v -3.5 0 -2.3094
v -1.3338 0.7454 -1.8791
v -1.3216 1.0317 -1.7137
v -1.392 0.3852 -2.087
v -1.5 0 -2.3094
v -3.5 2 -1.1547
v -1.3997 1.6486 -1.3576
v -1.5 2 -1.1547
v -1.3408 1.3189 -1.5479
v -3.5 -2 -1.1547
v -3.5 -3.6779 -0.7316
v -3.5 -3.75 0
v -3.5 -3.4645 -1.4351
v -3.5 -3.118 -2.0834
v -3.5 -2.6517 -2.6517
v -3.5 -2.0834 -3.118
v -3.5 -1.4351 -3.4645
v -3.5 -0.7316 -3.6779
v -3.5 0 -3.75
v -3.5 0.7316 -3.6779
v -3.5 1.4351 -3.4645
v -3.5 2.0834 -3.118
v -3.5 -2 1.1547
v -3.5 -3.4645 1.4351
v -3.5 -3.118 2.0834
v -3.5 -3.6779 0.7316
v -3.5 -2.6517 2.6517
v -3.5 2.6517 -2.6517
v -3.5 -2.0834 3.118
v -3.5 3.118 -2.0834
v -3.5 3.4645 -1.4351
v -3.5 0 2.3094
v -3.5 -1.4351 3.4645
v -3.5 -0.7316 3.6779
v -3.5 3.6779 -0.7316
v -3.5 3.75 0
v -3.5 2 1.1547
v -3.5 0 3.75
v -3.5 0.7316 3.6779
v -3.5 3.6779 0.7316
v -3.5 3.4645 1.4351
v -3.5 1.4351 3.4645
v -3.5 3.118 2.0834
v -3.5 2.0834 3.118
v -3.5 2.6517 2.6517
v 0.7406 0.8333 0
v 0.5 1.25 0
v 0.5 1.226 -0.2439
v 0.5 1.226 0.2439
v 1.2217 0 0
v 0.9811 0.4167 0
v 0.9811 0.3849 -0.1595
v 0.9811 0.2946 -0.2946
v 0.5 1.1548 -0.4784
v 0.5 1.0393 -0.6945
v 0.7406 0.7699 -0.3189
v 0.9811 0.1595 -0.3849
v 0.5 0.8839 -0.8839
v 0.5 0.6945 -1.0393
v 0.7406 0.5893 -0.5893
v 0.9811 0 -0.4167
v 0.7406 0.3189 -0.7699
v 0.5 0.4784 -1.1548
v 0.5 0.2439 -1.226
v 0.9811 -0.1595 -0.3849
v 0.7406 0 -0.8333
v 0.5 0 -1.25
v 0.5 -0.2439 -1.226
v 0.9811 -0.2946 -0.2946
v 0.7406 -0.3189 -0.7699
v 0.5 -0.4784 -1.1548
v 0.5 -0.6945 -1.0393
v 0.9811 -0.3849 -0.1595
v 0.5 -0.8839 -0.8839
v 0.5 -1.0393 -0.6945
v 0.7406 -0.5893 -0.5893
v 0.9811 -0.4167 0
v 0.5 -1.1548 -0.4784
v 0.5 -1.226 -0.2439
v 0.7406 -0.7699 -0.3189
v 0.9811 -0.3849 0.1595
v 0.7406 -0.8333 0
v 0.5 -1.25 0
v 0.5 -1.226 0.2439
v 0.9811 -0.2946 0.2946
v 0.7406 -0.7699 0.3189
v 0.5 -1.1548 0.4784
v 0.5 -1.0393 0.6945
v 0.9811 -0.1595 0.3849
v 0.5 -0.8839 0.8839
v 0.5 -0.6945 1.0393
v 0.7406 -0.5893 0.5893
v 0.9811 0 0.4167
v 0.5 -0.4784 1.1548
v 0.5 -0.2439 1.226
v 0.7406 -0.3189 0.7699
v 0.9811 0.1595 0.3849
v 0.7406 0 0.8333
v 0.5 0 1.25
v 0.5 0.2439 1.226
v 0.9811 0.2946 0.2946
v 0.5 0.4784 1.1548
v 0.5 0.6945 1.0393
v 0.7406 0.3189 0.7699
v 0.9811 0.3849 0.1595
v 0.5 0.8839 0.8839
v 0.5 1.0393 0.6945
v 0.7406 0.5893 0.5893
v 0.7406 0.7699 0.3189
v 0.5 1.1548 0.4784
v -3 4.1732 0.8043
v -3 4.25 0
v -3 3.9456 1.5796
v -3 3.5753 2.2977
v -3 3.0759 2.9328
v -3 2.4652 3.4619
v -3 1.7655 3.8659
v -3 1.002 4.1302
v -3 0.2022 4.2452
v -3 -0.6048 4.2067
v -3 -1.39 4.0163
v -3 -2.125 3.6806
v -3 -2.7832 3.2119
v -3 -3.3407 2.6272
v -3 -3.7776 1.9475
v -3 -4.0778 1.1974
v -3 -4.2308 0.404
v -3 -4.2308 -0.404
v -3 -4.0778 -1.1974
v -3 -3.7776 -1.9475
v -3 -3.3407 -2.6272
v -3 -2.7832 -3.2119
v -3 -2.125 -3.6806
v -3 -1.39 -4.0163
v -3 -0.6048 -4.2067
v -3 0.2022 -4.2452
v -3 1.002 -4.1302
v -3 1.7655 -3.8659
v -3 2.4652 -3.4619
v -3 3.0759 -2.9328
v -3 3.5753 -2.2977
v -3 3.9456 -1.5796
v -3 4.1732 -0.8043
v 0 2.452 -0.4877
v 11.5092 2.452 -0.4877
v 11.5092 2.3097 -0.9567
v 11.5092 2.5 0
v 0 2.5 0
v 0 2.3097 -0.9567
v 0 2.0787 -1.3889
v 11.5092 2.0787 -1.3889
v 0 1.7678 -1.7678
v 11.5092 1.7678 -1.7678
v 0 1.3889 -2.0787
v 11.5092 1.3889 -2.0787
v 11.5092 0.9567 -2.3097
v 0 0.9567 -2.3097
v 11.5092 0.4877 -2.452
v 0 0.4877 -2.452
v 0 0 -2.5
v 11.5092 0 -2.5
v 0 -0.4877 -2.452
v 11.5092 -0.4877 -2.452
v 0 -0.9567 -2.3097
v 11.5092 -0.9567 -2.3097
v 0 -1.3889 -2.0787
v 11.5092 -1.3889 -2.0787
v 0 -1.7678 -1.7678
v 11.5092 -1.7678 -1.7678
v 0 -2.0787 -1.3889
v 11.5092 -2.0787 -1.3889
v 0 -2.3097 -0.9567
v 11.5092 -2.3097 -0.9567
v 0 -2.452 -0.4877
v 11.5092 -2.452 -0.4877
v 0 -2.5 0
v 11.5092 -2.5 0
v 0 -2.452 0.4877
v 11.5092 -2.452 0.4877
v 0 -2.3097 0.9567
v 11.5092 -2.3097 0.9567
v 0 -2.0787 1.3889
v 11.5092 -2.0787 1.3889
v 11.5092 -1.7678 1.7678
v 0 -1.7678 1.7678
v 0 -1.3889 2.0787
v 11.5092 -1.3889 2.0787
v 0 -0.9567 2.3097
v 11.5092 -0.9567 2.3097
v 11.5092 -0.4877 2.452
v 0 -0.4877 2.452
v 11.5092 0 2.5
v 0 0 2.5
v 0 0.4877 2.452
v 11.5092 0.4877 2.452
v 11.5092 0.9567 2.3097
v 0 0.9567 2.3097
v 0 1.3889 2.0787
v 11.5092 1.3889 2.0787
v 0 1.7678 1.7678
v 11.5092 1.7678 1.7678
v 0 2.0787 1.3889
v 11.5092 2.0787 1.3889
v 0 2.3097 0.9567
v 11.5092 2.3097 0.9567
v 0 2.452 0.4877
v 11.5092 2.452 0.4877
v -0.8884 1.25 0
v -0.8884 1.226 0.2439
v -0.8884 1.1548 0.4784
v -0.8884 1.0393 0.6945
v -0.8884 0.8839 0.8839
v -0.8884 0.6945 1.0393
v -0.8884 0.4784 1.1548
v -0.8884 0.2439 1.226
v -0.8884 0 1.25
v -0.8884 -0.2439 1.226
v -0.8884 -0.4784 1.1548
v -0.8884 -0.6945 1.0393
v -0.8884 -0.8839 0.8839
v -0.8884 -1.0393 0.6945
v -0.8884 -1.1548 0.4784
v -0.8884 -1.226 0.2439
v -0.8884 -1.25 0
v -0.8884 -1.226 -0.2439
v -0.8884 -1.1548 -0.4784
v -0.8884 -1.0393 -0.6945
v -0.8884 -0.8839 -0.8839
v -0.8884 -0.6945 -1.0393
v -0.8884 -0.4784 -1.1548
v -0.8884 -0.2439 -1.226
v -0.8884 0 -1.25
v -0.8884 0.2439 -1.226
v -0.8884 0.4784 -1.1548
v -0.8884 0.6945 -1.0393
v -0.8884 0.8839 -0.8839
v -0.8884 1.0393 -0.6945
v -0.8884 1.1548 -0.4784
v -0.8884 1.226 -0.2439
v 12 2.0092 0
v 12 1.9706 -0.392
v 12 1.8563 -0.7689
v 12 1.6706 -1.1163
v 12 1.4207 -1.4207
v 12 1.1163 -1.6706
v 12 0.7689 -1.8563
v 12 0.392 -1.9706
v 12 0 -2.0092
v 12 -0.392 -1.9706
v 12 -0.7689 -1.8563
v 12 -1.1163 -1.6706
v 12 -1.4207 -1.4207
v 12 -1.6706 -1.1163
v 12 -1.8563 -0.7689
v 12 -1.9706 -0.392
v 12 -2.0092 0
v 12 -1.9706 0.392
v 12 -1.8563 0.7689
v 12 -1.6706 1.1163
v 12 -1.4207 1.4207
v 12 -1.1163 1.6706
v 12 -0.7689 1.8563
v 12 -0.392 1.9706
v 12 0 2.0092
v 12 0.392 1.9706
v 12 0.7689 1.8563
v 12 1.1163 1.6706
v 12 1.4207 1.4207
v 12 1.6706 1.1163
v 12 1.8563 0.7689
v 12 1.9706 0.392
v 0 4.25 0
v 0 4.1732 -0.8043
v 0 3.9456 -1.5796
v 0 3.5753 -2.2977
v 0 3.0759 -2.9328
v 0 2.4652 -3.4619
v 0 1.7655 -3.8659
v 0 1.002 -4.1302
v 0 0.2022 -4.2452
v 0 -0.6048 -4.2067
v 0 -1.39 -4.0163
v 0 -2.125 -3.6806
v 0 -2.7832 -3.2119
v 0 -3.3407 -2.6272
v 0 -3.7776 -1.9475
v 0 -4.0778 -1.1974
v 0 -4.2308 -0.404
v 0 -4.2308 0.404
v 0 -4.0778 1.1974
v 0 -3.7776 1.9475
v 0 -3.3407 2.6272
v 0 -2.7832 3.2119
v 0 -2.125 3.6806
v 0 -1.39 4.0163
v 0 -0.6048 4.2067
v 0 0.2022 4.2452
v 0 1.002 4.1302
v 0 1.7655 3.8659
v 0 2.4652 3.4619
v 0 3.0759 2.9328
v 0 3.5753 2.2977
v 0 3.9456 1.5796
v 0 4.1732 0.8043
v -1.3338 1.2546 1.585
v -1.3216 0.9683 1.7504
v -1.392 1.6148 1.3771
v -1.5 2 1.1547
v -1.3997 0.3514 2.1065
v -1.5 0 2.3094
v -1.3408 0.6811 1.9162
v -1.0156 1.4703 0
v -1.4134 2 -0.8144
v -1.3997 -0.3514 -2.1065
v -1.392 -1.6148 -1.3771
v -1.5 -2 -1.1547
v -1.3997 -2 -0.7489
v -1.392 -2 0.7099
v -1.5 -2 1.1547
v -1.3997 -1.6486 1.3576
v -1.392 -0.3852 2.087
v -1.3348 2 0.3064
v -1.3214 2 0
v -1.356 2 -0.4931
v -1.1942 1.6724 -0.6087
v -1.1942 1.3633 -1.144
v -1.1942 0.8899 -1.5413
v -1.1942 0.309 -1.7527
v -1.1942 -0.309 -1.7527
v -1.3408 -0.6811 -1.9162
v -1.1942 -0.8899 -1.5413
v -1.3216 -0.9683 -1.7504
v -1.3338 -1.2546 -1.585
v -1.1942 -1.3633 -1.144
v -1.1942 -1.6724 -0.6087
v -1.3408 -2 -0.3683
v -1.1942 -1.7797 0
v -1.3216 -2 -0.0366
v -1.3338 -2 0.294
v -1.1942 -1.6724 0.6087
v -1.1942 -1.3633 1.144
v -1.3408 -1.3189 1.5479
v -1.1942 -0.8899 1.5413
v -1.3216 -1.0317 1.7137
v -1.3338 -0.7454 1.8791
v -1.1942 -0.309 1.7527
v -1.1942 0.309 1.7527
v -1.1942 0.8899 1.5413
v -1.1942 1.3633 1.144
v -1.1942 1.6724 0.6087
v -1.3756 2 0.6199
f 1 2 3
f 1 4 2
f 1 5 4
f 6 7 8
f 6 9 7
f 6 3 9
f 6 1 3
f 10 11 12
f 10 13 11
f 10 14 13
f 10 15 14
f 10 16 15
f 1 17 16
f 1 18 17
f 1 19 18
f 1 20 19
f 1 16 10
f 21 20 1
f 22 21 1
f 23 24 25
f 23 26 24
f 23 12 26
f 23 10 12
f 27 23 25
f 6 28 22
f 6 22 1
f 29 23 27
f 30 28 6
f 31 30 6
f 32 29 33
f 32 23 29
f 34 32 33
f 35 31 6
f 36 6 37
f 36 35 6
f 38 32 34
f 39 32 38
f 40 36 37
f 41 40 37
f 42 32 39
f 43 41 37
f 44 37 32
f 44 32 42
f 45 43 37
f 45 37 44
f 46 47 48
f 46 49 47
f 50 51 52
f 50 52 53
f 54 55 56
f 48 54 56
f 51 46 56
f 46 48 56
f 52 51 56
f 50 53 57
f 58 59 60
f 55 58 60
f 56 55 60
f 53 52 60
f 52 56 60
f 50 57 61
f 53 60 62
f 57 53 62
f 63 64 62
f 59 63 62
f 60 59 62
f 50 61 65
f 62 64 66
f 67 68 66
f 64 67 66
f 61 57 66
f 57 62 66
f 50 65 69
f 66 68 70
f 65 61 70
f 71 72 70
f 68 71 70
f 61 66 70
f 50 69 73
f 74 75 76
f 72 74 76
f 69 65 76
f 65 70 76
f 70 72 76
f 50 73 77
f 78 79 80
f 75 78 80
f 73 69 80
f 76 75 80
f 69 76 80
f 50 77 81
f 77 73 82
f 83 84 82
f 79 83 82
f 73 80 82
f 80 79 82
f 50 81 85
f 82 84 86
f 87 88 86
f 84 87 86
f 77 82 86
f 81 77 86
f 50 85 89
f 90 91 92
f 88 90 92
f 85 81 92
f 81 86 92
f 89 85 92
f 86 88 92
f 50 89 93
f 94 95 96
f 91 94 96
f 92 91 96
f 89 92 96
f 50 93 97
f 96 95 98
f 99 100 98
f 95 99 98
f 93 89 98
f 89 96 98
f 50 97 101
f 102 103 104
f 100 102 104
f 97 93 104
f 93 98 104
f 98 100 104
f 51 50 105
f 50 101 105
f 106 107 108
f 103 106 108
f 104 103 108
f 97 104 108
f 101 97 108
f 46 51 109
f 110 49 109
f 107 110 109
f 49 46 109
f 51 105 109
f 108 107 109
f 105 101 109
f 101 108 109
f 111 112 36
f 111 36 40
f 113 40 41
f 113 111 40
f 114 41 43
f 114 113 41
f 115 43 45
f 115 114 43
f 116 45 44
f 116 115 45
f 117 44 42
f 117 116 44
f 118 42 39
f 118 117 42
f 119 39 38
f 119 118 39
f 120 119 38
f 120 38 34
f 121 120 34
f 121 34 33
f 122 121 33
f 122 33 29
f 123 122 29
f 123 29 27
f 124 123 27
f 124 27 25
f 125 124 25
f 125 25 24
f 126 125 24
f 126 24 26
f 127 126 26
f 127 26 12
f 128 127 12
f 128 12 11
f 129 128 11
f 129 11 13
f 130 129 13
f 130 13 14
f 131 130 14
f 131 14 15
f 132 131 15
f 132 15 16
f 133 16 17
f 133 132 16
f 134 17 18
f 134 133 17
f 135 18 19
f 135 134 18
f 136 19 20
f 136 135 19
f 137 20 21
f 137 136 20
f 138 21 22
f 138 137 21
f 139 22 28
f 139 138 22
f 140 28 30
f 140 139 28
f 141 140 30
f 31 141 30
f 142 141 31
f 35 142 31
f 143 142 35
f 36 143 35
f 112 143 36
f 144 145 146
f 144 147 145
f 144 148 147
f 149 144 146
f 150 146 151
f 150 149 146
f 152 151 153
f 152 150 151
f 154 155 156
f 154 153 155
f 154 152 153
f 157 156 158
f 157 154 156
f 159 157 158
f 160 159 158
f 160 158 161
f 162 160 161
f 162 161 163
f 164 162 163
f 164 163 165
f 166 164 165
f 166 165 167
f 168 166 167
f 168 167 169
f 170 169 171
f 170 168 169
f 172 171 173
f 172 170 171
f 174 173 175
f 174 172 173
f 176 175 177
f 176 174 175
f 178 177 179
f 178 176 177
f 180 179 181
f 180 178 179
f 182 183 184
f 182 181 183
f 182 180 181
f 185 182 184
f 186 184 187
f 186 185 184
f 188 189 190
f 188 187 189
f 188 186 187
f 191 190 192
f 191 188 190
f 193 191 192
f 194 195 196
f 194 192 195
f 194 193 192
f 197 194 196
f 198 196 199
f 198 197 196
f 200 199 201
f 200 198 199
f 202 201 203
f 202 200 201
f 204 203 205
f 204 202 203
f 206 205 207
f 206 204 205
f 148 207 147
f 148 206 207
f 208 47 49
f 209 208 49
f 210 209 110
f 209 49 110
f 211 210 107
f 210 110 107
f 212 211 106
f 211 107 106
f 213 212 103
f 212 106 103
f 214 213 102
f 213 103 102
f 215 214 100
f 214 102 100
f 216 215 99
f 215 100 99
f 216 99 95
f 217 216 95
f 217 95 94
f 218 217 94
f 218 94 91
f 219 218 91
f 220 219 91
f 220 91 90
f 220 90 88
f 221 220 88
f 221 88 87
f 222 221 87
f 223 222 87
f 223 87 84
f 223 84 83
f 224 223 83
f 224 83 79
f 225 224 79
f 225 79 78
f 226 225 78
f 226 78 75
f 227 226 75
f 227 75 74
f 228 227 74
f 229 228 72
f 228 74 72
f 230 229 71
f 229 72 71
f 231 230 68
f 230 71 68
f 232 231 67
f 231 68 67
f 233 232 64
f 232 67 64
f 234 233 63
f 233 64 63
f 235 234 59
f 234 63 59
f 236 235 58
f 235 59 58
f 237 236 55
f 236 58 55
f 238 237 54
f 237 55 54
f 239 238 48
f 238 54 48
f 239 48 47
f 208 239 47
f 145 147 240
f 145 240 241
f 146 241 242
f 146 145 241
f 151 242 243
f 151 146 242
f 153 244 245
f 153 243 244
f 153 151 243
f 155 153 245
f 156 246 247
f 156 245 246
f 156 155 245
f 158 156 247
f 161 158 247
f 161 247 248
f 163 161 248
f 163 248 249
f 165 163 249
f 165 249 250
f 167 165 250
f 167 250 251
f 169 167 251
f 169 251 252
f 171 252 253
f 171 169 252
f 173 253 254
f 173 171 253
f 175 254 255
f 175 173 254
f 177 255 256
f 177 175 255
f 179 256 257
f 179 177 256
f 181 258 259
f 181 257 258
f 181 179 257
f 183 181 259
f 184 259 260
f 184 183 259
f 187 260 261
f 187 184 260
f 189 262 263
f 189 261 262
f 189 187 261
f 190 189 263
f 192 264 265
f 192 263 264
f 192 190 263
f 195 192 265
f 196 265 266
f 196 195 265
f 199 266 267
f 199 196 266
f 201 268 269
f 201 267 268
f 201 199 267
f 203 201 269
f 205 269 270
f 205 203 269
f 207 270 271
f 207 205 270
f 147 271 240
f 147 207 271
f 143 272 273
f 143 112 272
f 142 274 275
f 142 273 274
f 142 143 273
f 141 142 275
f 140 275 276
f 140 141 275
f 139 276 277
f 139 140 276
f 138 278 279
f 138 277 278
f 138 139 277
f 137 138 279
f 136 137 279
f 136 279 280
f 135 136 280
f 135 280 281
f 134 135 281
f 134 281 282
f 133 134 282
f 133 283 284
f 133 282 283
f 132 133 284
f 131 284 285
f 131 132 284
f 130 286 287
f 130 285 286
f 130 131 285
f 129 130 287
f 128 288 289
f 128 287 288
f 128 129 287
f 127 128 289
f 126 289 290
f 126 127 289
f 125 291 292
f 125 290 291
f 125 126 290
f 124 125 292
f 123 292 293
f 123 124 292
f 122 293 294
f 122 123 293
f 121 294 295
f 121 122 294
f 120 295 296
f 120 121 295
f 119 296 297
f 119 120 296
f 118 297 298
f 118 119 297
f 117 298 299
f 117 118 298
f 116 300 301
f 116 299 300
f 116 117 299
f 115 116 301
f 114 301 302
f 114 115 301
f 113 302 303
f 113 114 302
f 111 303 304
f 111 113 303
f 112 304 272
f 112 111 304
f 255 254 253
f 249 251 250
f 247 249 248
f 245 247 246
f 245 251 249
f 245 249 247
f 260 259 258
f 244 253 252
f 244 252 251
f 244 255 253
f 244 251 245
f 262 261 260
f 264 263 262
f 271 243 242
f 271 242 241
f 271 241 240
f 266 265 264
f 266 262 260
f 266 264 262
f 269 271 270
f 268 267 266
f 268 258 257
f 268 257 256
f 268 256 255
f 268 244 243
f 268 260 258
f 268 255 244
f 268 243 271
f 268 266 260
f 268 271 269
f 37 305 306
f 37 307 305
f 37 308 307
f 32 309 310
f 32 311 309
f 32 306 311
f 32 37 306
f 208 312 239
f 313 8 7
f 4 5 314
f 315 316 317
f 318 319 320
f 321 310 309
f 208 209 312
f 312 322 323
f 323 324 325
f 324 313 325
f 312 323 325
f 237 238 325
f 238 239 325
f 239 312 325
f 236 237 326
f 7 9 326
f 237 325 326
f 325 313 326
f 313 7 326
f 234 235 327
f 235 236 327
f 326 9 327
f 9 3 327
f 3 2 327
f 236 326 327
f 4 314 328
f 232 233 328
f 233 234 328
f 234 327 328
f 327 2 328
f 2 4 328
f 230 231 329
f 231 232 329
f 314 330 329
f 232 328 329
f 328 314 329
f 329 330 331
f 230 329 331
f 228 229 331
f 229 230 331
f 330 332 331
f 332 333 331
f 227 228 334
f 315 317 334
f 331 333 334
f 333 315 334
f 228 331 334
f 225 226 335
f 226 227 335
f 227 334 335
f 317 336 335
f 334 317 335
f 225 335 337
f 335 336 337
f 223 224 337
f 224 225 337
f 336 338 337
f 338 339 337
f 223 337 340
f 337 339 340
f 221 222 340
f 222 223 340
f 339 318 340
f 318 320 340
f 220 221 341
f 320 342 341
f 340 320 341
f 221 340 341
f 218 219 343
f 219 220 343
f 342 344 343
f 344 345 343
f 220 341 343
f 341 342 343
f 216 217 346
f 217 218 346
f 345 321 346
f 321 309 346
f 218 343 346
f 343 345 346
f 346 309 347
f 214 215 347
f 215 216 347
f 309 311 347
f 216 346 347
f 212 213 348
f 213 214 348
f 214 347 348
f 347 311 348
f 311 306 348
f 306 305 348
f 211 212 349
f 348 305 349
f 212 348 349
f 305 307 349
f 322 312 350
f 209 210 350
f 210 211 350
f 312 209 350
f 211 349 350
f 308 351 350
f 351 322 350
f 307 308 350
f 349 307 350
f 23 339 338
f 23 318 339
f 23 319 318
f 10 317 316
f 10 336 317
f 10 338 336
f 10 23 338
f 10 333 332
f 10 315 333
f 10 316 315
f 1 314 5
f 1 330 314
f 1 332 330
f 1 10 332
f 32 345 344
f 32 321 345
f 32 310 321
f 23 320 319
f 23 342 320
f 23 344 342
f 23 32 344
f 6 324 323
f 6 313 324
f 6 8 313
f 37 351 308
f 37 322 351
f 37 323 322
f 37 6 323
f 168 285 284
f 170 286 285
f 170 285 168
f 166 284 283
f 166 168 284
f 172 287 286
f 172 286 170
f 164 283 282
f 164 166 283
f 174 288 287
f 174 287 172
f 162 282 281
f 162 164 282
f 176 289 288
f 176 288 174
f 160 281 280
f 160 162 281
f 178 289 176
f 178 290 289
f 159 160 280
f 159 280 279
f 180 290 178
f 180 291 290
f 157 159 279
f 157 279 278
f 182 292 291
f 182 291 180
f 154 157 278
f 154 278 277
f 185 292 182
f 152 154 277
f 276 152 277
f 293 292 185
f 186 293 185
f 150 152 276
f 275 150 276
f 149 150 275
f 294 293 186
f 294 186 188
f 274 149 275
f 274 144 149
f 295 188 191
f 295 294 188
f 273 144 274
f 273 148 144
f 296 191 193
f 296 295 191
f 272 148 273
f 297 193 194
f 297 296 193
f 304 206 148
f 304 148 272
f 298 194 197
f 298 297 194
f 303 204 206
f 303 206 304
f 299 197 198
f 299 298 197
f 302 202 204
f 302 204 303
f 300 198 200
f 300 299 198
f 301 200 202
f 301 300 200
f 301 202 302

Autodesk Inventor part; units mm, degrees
ref_plane "YZ Plane" through (0, 0, 0) normal (1, 0, 0) x (0, 1, 0)
ref_plane "XZ Plane" through (0, 0, 0) normal (0, 1, 0) x (-1, 0, 0)
sketch "Sketch1" plane through (0, 0, 0) normal (0, 0, 1) x (1, 0, 0)
  line L0 (1.2217, 0) -> (12, 0)
  line L1 (12, 0) -> (12, 2.5)
  line L2 (12, 2.5) -> (0, 2.5)
  line L3 (0, 2.5) -> (0, 4.25)
  line L4 (0, 4.25) -> (-3.5, 4.25)
  line L5 (-3.5, 4.25) -> (-3.5, 2.3094)
  line L6 (-3.5, 2.3094) -> (-1.5, 2.3094)
  line L7 (-1.5, 2.3094) -> (-0.8884, 1.25)
  line L8 (-6.6, 0) -> (15.1, 0) projected
  line L9 (0, -0.85) -> (0, 5.1) projected
  line L10 (-0.8884, 1.25) -> (0.5, 1.25)
  line L11 (0.5, 1.25) -> (1.2217, 0)
  line L12 (-3.5, 2.3094) -> (-3.5, 0) construction
  line L13 (-3.5, 3.75) -> (-3, 4.25)
  dimension "d0" = 3.5
  dimension "d1" = 2
  dimension "d2" = 60
  dimension "d3" = 5
  dimension "d4" = 4.6188
  dimension "d5" = 8.5
  dimension "d15" = 4
  dimension "d16" = 2.5
  dimension "d17" = 12
  dimension "d32" = 45
  dimension "d33" = 0.5
revolve "Body" add sketch "Sketch1" angle 360 about axis through (1.2217, 0, 0) along (1, 0, 0) contours L11 L10 L9 L2 L1 L0 | L10 L7 L6 L5 L13 L4 L3 L9 | L13 L5 L4
revolve "Chamfer2" cut sketch "Sketch1" angle 360 about axis through (-10, 0, 0) along (1, 0, 0) contours L13 L5 L4
sketch "Sketch2" plane through (-3.5, 0, 0) normal (-1, 0, 0) x (0, 0, 1)
  circle A0 centre (0, 0) radius 2.3094 projected
  line L0 (0, -5.95) -> (0, 5.95) projected
  line L1 (-5.95, 0) -> (5.95, 0) projected
  line L2 (2.3094, 0) -> (1.1547, -2)
  line L3 (1.1547, -2) -> (-1.1547, -2)
  line L4 (-1.1547, -2) -> (-2.3094, 0)
  line L5 (-2.3094, 0) -> (-1.1547, 2)
  line L6 (-1.1547, 2) -> (1.1547, 2)
  line L7 (1.1547, 2) -> (2.3094, 0)
extrude "Slot" add sketch "Sketch2" against normal up to next contours L7 A0 | A0 L2 | L6 L0 A0 | A0 L0 L3 | L0 L6 A0 | A0 L3 L0 | L4 A0 | A0 L5
thread "Thread" size "M5x0.8" class "6g" standard "ISO Metric profile" length 7.8
chamfer "Chamfer1" distance 0.4908 distance2 0.4908 1 edges at (12, -2.5, 0) measured on face at (12, -0.7741, -0.6858)
ref_plane "Work Plane1" through (6, 0, 0) normal (0, 0.5, 0.8660254) x (1, 0, 0)
equation "\"d0\" = KOH"
equation "\"d1\" = INTI"
equation "\"d3\" = GD"
equation "\"d4\" = 1.1547 * SW"
equation "\"d5\" = KOD"
equation "\"d15\" = INFT"
equation "\"d16\" = SDT"
equation "\"d17\" = NLG"
equation "\"d33\" = Cham"
equation "\"d7\" = GEL"
equation "\"d9\" = -0.5 * SPD + 0.5 * GD"
equation "\"d12\" = GUL"
equation "\"GD\" = NND"
equation "\"NLG\" = 12"
equation "\"GEL\" = 7.8"
equation "\"KOD\" = 8.5"
equation "\"KOH\" = 3.5"
equation "\"GUL\" = 0.61345 * PTC"
equation "\"SW\" = 4"
equation "\"INTI\" = 2"
equation "\"SPD\" = NND - 1.2269 * PTC"
equation "\"SDT\" = 2.5"
equation "\"INFT\" = 4"
equation "\"Cham\" = 0.5"
equation "\"TOA\" = 30deg"
equation "\"GD1\" = THREADDIA - 1.2269 * PTC"
equation "\"THREADDIA\" = 5"
equation "\"BDM\" = NND"
equation "\"FAWI\" = 45deg"
equation "\"RR\" = 0.1 * NND"
equation "\"PTC\" = 0.8"
equation "\"NND\" = 5"
equation "\"FAWI1\" = 45deg"
equation "\"GAL\" = 0.61345 * PTC"
equation "\"E0\" = 1.155 * SW"
properties part number "DIN 6912 - M5 x 12" material "Steel, Mild"
